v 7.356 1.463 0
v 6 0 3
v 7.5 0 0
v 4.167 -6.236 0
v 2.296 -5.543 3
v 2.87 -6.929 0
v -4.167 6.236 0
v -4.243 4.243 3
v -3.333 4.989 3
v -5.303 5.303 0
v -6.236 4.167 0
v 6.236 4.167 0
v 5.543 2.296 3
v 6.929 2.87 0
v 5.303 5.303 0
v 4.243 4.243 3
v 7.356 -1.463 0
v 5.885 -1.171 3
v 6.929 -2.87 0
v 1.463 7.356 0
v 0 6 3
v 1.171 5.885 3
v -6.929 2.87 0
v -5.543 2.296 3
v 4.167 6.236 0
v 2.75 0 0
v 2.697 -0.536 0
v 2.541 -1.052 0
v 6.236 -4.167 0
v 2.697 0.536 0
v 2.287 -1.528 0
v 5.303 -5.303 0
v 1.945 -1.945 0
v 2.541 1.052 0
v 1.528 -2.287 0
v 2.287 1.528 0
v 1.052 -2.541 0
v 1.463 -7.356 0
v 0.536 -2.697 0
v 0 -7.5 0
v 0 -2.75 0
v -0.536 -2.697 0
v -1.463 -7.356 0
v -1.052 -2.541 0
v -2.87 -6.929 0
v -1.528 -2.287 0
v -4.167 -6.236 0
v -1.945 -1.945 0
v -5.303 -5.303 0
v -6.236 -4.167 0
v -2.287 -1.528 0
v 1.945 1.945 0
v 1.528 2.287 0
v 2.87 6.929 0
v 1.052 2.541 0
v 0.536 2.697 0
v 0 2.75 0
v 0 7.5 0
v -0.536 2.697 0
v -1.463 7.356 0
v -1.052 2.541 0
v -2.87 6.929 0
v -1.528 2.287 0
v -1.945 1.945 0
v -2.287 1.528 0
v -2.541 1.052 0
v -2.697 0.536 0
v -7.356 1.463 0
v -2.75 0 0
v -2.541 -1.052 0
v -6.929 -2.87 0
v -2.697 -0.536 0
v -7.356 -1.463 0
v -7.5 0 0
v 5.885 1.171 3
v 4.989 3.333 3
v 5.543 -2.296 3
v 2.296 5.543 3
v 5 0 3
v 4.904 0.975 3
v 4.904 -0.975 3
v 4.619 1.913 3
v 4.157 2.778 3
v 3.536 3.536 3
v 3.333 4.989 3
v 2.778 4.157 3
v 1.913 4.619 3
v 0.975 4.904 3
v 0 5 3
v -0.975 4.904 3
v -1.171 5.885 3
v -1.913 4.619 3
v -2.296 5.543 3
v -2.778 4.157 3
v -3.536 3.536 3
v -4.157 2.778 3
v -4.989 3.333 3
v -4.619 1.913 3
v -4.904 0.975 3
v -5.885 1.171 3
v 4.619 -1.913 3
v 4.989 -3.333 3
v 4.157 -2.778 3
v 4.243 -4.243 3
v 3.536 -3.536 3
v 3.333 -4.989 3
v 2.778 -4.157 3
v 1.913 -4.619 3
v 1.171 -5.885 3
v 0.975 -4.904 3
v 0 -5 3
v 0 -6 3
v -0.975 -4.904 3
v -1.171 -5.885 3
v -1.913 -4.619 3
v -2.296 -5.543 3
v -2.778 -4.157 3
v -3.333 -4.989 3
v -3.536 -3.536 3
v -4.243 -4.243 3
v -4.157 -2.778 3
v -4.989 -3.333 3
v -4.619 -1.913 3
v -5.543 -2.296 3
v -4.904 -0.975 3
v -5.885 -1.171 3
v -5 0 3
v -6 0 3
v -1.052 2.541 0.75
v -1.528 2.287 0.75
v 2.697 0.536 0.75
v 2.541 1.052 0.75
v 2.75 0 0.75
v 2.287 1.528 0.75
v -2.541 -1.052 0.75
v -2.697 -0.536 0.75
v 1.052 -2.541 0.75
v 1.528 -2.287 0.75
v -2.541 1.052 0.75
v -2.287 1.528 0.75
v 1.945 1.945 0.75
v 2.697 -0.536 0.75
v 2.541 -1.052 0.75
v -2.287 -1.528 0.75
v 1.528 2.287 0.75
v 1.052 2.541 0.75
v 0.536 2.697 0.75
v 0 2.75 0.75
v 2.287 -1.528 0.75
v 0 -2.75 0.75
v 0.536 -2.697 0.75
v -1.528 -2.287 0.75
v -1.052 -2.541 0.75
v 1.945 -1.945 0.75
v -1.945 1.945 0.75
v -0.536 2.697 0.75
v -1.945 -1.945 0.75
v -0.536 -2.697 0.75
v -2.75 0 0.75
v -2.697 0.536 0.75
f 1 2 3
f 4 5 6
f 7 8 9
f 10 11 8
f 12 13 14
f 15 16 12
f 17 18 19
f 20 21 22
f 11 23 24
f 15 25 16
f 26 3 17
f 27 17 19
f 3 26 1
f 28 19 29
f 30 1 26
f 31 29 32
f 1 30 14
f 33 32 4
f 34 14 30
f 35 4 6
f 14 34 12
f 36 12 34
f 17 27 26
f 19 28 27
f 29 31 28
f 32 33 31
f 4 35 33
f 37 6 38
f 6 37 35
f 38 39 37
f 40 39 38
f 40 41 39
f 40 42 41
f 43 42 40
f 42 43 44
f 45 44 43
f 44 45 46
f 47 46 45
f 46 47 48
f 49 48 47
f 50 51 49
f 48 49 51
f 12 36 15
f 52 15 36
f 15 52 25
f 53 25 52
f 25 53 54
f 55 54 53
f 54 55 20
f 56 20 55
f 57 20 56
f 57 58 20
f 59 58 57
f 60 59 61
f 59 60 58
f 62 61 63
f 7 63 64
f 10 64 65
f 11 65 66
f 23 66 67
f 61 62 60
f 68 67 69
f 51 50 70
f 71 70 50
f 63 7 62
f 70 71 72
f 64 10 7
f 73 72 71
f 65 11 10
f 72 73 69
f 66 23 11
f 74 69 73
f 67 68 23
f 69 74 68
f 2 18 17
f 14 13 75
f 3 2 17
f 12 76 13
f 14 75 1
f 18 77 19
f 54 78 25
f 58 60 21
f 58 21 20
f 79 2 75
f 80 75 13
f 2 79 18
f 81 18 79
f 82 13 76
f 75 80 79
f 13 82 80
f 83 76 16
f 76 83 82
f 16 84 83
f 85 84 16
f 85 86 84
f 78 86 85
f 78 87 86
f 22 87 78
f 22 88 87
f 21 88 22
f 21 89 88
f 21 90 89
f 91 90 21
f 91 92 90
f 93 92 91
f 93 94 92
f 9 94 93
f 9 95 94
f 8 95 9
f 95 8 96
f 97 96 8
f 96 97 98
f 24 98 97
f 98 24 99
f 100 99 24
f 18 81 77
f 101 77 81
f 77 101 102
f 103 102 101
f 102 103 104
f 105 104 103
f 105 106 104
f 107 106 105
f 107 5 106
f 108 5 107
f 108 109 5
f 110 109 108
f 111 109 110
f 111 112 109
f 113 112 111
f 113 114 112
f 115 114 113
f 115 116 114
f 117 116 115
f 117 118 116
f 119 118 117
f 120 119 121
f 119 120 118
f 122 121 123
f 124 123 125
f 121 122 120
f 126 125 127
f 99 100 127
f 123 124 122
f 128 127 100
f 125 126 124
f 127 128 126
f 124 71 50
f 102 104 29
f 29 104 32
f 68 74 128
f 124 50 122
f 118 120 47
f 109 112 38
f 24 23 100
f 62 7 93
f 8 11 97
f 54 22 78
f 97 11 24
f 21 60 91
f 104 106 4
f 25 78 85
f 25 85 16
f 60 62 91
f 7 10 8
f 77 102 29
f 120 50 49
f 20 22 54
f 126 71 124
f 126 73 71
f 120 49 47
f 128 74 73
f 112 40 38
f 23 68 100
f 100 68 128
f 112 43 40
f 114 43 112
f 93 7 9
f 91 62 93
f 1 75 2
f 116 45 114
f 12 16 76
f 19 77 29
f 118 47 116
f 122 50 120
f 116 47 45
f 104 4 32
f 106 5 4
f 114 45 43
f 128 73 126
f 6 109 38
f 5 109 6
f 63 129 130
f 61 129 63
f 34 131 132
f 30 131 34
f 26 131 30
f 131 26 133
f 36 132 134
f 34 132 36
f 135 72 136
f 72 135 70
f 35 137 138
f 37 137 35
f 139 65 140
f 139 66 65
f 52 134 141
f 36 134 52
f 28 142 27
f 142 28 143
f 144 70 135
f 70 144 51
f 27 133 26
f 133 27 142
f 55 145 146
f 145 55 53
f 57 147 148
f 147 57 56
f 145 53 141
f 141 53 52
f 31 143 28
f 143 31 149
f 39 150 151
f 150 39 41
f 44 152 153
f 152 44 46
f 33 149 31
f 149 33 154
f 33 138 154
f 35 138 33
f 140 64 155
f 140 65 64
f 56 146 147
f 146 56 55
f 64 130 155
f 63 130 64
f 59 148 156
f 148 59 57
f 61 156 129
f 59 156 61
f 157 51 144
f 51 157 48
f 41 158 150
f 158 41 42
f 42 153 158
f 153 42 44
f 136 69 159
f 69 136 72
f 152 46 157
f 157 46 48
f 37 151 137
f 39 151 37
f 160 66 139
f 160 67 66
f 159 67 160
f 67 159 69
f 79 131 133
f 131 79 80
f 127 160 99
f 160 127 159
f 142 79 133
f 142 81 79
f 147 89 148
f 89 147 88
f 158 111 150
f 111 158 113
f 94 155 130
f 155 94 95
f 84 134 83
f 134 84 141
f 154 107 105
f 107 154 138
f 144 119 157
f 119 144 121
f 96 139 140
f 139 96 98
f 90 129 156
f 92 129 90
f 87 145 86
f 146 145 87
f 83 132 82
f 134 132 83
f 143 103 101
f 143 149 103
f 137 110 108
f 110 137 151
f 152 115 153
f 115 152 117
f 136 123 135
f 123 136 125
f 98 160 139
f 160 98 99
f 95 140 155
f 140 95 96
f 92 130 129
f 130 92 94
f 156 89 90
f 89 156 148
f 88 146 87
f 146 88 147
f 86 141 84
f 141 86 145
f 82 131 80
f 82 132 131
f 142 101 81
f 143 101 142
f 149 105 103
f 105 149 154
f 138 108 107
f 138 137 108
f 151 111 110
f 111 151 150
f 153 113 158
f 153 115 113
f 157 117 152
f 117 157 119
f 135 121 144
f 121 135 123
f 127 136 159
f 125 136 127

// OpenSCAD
$fn=32;

module single() {
    difference() {
        cylinder(d1=15, d2=12, h=3);
        translate([0, 0, -0.05]) cylinder(d=5.5, h=3.1);
        translate([0, 0, -2]) cylinder(d2=10, d1=0, h=5);
    }
}

module double() {
    difference() {
        hull() {
            translate([27.5, 0, 0])
                cylinder(d1=15, d2=12, h=3);
            translate([-27.5, 0, 0])
                cylinder(d1=15, d2=12, h=3);
        }
        for(x=[27.5, -27.5]) {
            translate([x, 0, 0]) {
                cylinder(d=5.5, h=3.1);
                translate([0, 0, -2])
                    cylinder(d2=10, d1=0, h=5);
            }
        }
    }
}

single();
